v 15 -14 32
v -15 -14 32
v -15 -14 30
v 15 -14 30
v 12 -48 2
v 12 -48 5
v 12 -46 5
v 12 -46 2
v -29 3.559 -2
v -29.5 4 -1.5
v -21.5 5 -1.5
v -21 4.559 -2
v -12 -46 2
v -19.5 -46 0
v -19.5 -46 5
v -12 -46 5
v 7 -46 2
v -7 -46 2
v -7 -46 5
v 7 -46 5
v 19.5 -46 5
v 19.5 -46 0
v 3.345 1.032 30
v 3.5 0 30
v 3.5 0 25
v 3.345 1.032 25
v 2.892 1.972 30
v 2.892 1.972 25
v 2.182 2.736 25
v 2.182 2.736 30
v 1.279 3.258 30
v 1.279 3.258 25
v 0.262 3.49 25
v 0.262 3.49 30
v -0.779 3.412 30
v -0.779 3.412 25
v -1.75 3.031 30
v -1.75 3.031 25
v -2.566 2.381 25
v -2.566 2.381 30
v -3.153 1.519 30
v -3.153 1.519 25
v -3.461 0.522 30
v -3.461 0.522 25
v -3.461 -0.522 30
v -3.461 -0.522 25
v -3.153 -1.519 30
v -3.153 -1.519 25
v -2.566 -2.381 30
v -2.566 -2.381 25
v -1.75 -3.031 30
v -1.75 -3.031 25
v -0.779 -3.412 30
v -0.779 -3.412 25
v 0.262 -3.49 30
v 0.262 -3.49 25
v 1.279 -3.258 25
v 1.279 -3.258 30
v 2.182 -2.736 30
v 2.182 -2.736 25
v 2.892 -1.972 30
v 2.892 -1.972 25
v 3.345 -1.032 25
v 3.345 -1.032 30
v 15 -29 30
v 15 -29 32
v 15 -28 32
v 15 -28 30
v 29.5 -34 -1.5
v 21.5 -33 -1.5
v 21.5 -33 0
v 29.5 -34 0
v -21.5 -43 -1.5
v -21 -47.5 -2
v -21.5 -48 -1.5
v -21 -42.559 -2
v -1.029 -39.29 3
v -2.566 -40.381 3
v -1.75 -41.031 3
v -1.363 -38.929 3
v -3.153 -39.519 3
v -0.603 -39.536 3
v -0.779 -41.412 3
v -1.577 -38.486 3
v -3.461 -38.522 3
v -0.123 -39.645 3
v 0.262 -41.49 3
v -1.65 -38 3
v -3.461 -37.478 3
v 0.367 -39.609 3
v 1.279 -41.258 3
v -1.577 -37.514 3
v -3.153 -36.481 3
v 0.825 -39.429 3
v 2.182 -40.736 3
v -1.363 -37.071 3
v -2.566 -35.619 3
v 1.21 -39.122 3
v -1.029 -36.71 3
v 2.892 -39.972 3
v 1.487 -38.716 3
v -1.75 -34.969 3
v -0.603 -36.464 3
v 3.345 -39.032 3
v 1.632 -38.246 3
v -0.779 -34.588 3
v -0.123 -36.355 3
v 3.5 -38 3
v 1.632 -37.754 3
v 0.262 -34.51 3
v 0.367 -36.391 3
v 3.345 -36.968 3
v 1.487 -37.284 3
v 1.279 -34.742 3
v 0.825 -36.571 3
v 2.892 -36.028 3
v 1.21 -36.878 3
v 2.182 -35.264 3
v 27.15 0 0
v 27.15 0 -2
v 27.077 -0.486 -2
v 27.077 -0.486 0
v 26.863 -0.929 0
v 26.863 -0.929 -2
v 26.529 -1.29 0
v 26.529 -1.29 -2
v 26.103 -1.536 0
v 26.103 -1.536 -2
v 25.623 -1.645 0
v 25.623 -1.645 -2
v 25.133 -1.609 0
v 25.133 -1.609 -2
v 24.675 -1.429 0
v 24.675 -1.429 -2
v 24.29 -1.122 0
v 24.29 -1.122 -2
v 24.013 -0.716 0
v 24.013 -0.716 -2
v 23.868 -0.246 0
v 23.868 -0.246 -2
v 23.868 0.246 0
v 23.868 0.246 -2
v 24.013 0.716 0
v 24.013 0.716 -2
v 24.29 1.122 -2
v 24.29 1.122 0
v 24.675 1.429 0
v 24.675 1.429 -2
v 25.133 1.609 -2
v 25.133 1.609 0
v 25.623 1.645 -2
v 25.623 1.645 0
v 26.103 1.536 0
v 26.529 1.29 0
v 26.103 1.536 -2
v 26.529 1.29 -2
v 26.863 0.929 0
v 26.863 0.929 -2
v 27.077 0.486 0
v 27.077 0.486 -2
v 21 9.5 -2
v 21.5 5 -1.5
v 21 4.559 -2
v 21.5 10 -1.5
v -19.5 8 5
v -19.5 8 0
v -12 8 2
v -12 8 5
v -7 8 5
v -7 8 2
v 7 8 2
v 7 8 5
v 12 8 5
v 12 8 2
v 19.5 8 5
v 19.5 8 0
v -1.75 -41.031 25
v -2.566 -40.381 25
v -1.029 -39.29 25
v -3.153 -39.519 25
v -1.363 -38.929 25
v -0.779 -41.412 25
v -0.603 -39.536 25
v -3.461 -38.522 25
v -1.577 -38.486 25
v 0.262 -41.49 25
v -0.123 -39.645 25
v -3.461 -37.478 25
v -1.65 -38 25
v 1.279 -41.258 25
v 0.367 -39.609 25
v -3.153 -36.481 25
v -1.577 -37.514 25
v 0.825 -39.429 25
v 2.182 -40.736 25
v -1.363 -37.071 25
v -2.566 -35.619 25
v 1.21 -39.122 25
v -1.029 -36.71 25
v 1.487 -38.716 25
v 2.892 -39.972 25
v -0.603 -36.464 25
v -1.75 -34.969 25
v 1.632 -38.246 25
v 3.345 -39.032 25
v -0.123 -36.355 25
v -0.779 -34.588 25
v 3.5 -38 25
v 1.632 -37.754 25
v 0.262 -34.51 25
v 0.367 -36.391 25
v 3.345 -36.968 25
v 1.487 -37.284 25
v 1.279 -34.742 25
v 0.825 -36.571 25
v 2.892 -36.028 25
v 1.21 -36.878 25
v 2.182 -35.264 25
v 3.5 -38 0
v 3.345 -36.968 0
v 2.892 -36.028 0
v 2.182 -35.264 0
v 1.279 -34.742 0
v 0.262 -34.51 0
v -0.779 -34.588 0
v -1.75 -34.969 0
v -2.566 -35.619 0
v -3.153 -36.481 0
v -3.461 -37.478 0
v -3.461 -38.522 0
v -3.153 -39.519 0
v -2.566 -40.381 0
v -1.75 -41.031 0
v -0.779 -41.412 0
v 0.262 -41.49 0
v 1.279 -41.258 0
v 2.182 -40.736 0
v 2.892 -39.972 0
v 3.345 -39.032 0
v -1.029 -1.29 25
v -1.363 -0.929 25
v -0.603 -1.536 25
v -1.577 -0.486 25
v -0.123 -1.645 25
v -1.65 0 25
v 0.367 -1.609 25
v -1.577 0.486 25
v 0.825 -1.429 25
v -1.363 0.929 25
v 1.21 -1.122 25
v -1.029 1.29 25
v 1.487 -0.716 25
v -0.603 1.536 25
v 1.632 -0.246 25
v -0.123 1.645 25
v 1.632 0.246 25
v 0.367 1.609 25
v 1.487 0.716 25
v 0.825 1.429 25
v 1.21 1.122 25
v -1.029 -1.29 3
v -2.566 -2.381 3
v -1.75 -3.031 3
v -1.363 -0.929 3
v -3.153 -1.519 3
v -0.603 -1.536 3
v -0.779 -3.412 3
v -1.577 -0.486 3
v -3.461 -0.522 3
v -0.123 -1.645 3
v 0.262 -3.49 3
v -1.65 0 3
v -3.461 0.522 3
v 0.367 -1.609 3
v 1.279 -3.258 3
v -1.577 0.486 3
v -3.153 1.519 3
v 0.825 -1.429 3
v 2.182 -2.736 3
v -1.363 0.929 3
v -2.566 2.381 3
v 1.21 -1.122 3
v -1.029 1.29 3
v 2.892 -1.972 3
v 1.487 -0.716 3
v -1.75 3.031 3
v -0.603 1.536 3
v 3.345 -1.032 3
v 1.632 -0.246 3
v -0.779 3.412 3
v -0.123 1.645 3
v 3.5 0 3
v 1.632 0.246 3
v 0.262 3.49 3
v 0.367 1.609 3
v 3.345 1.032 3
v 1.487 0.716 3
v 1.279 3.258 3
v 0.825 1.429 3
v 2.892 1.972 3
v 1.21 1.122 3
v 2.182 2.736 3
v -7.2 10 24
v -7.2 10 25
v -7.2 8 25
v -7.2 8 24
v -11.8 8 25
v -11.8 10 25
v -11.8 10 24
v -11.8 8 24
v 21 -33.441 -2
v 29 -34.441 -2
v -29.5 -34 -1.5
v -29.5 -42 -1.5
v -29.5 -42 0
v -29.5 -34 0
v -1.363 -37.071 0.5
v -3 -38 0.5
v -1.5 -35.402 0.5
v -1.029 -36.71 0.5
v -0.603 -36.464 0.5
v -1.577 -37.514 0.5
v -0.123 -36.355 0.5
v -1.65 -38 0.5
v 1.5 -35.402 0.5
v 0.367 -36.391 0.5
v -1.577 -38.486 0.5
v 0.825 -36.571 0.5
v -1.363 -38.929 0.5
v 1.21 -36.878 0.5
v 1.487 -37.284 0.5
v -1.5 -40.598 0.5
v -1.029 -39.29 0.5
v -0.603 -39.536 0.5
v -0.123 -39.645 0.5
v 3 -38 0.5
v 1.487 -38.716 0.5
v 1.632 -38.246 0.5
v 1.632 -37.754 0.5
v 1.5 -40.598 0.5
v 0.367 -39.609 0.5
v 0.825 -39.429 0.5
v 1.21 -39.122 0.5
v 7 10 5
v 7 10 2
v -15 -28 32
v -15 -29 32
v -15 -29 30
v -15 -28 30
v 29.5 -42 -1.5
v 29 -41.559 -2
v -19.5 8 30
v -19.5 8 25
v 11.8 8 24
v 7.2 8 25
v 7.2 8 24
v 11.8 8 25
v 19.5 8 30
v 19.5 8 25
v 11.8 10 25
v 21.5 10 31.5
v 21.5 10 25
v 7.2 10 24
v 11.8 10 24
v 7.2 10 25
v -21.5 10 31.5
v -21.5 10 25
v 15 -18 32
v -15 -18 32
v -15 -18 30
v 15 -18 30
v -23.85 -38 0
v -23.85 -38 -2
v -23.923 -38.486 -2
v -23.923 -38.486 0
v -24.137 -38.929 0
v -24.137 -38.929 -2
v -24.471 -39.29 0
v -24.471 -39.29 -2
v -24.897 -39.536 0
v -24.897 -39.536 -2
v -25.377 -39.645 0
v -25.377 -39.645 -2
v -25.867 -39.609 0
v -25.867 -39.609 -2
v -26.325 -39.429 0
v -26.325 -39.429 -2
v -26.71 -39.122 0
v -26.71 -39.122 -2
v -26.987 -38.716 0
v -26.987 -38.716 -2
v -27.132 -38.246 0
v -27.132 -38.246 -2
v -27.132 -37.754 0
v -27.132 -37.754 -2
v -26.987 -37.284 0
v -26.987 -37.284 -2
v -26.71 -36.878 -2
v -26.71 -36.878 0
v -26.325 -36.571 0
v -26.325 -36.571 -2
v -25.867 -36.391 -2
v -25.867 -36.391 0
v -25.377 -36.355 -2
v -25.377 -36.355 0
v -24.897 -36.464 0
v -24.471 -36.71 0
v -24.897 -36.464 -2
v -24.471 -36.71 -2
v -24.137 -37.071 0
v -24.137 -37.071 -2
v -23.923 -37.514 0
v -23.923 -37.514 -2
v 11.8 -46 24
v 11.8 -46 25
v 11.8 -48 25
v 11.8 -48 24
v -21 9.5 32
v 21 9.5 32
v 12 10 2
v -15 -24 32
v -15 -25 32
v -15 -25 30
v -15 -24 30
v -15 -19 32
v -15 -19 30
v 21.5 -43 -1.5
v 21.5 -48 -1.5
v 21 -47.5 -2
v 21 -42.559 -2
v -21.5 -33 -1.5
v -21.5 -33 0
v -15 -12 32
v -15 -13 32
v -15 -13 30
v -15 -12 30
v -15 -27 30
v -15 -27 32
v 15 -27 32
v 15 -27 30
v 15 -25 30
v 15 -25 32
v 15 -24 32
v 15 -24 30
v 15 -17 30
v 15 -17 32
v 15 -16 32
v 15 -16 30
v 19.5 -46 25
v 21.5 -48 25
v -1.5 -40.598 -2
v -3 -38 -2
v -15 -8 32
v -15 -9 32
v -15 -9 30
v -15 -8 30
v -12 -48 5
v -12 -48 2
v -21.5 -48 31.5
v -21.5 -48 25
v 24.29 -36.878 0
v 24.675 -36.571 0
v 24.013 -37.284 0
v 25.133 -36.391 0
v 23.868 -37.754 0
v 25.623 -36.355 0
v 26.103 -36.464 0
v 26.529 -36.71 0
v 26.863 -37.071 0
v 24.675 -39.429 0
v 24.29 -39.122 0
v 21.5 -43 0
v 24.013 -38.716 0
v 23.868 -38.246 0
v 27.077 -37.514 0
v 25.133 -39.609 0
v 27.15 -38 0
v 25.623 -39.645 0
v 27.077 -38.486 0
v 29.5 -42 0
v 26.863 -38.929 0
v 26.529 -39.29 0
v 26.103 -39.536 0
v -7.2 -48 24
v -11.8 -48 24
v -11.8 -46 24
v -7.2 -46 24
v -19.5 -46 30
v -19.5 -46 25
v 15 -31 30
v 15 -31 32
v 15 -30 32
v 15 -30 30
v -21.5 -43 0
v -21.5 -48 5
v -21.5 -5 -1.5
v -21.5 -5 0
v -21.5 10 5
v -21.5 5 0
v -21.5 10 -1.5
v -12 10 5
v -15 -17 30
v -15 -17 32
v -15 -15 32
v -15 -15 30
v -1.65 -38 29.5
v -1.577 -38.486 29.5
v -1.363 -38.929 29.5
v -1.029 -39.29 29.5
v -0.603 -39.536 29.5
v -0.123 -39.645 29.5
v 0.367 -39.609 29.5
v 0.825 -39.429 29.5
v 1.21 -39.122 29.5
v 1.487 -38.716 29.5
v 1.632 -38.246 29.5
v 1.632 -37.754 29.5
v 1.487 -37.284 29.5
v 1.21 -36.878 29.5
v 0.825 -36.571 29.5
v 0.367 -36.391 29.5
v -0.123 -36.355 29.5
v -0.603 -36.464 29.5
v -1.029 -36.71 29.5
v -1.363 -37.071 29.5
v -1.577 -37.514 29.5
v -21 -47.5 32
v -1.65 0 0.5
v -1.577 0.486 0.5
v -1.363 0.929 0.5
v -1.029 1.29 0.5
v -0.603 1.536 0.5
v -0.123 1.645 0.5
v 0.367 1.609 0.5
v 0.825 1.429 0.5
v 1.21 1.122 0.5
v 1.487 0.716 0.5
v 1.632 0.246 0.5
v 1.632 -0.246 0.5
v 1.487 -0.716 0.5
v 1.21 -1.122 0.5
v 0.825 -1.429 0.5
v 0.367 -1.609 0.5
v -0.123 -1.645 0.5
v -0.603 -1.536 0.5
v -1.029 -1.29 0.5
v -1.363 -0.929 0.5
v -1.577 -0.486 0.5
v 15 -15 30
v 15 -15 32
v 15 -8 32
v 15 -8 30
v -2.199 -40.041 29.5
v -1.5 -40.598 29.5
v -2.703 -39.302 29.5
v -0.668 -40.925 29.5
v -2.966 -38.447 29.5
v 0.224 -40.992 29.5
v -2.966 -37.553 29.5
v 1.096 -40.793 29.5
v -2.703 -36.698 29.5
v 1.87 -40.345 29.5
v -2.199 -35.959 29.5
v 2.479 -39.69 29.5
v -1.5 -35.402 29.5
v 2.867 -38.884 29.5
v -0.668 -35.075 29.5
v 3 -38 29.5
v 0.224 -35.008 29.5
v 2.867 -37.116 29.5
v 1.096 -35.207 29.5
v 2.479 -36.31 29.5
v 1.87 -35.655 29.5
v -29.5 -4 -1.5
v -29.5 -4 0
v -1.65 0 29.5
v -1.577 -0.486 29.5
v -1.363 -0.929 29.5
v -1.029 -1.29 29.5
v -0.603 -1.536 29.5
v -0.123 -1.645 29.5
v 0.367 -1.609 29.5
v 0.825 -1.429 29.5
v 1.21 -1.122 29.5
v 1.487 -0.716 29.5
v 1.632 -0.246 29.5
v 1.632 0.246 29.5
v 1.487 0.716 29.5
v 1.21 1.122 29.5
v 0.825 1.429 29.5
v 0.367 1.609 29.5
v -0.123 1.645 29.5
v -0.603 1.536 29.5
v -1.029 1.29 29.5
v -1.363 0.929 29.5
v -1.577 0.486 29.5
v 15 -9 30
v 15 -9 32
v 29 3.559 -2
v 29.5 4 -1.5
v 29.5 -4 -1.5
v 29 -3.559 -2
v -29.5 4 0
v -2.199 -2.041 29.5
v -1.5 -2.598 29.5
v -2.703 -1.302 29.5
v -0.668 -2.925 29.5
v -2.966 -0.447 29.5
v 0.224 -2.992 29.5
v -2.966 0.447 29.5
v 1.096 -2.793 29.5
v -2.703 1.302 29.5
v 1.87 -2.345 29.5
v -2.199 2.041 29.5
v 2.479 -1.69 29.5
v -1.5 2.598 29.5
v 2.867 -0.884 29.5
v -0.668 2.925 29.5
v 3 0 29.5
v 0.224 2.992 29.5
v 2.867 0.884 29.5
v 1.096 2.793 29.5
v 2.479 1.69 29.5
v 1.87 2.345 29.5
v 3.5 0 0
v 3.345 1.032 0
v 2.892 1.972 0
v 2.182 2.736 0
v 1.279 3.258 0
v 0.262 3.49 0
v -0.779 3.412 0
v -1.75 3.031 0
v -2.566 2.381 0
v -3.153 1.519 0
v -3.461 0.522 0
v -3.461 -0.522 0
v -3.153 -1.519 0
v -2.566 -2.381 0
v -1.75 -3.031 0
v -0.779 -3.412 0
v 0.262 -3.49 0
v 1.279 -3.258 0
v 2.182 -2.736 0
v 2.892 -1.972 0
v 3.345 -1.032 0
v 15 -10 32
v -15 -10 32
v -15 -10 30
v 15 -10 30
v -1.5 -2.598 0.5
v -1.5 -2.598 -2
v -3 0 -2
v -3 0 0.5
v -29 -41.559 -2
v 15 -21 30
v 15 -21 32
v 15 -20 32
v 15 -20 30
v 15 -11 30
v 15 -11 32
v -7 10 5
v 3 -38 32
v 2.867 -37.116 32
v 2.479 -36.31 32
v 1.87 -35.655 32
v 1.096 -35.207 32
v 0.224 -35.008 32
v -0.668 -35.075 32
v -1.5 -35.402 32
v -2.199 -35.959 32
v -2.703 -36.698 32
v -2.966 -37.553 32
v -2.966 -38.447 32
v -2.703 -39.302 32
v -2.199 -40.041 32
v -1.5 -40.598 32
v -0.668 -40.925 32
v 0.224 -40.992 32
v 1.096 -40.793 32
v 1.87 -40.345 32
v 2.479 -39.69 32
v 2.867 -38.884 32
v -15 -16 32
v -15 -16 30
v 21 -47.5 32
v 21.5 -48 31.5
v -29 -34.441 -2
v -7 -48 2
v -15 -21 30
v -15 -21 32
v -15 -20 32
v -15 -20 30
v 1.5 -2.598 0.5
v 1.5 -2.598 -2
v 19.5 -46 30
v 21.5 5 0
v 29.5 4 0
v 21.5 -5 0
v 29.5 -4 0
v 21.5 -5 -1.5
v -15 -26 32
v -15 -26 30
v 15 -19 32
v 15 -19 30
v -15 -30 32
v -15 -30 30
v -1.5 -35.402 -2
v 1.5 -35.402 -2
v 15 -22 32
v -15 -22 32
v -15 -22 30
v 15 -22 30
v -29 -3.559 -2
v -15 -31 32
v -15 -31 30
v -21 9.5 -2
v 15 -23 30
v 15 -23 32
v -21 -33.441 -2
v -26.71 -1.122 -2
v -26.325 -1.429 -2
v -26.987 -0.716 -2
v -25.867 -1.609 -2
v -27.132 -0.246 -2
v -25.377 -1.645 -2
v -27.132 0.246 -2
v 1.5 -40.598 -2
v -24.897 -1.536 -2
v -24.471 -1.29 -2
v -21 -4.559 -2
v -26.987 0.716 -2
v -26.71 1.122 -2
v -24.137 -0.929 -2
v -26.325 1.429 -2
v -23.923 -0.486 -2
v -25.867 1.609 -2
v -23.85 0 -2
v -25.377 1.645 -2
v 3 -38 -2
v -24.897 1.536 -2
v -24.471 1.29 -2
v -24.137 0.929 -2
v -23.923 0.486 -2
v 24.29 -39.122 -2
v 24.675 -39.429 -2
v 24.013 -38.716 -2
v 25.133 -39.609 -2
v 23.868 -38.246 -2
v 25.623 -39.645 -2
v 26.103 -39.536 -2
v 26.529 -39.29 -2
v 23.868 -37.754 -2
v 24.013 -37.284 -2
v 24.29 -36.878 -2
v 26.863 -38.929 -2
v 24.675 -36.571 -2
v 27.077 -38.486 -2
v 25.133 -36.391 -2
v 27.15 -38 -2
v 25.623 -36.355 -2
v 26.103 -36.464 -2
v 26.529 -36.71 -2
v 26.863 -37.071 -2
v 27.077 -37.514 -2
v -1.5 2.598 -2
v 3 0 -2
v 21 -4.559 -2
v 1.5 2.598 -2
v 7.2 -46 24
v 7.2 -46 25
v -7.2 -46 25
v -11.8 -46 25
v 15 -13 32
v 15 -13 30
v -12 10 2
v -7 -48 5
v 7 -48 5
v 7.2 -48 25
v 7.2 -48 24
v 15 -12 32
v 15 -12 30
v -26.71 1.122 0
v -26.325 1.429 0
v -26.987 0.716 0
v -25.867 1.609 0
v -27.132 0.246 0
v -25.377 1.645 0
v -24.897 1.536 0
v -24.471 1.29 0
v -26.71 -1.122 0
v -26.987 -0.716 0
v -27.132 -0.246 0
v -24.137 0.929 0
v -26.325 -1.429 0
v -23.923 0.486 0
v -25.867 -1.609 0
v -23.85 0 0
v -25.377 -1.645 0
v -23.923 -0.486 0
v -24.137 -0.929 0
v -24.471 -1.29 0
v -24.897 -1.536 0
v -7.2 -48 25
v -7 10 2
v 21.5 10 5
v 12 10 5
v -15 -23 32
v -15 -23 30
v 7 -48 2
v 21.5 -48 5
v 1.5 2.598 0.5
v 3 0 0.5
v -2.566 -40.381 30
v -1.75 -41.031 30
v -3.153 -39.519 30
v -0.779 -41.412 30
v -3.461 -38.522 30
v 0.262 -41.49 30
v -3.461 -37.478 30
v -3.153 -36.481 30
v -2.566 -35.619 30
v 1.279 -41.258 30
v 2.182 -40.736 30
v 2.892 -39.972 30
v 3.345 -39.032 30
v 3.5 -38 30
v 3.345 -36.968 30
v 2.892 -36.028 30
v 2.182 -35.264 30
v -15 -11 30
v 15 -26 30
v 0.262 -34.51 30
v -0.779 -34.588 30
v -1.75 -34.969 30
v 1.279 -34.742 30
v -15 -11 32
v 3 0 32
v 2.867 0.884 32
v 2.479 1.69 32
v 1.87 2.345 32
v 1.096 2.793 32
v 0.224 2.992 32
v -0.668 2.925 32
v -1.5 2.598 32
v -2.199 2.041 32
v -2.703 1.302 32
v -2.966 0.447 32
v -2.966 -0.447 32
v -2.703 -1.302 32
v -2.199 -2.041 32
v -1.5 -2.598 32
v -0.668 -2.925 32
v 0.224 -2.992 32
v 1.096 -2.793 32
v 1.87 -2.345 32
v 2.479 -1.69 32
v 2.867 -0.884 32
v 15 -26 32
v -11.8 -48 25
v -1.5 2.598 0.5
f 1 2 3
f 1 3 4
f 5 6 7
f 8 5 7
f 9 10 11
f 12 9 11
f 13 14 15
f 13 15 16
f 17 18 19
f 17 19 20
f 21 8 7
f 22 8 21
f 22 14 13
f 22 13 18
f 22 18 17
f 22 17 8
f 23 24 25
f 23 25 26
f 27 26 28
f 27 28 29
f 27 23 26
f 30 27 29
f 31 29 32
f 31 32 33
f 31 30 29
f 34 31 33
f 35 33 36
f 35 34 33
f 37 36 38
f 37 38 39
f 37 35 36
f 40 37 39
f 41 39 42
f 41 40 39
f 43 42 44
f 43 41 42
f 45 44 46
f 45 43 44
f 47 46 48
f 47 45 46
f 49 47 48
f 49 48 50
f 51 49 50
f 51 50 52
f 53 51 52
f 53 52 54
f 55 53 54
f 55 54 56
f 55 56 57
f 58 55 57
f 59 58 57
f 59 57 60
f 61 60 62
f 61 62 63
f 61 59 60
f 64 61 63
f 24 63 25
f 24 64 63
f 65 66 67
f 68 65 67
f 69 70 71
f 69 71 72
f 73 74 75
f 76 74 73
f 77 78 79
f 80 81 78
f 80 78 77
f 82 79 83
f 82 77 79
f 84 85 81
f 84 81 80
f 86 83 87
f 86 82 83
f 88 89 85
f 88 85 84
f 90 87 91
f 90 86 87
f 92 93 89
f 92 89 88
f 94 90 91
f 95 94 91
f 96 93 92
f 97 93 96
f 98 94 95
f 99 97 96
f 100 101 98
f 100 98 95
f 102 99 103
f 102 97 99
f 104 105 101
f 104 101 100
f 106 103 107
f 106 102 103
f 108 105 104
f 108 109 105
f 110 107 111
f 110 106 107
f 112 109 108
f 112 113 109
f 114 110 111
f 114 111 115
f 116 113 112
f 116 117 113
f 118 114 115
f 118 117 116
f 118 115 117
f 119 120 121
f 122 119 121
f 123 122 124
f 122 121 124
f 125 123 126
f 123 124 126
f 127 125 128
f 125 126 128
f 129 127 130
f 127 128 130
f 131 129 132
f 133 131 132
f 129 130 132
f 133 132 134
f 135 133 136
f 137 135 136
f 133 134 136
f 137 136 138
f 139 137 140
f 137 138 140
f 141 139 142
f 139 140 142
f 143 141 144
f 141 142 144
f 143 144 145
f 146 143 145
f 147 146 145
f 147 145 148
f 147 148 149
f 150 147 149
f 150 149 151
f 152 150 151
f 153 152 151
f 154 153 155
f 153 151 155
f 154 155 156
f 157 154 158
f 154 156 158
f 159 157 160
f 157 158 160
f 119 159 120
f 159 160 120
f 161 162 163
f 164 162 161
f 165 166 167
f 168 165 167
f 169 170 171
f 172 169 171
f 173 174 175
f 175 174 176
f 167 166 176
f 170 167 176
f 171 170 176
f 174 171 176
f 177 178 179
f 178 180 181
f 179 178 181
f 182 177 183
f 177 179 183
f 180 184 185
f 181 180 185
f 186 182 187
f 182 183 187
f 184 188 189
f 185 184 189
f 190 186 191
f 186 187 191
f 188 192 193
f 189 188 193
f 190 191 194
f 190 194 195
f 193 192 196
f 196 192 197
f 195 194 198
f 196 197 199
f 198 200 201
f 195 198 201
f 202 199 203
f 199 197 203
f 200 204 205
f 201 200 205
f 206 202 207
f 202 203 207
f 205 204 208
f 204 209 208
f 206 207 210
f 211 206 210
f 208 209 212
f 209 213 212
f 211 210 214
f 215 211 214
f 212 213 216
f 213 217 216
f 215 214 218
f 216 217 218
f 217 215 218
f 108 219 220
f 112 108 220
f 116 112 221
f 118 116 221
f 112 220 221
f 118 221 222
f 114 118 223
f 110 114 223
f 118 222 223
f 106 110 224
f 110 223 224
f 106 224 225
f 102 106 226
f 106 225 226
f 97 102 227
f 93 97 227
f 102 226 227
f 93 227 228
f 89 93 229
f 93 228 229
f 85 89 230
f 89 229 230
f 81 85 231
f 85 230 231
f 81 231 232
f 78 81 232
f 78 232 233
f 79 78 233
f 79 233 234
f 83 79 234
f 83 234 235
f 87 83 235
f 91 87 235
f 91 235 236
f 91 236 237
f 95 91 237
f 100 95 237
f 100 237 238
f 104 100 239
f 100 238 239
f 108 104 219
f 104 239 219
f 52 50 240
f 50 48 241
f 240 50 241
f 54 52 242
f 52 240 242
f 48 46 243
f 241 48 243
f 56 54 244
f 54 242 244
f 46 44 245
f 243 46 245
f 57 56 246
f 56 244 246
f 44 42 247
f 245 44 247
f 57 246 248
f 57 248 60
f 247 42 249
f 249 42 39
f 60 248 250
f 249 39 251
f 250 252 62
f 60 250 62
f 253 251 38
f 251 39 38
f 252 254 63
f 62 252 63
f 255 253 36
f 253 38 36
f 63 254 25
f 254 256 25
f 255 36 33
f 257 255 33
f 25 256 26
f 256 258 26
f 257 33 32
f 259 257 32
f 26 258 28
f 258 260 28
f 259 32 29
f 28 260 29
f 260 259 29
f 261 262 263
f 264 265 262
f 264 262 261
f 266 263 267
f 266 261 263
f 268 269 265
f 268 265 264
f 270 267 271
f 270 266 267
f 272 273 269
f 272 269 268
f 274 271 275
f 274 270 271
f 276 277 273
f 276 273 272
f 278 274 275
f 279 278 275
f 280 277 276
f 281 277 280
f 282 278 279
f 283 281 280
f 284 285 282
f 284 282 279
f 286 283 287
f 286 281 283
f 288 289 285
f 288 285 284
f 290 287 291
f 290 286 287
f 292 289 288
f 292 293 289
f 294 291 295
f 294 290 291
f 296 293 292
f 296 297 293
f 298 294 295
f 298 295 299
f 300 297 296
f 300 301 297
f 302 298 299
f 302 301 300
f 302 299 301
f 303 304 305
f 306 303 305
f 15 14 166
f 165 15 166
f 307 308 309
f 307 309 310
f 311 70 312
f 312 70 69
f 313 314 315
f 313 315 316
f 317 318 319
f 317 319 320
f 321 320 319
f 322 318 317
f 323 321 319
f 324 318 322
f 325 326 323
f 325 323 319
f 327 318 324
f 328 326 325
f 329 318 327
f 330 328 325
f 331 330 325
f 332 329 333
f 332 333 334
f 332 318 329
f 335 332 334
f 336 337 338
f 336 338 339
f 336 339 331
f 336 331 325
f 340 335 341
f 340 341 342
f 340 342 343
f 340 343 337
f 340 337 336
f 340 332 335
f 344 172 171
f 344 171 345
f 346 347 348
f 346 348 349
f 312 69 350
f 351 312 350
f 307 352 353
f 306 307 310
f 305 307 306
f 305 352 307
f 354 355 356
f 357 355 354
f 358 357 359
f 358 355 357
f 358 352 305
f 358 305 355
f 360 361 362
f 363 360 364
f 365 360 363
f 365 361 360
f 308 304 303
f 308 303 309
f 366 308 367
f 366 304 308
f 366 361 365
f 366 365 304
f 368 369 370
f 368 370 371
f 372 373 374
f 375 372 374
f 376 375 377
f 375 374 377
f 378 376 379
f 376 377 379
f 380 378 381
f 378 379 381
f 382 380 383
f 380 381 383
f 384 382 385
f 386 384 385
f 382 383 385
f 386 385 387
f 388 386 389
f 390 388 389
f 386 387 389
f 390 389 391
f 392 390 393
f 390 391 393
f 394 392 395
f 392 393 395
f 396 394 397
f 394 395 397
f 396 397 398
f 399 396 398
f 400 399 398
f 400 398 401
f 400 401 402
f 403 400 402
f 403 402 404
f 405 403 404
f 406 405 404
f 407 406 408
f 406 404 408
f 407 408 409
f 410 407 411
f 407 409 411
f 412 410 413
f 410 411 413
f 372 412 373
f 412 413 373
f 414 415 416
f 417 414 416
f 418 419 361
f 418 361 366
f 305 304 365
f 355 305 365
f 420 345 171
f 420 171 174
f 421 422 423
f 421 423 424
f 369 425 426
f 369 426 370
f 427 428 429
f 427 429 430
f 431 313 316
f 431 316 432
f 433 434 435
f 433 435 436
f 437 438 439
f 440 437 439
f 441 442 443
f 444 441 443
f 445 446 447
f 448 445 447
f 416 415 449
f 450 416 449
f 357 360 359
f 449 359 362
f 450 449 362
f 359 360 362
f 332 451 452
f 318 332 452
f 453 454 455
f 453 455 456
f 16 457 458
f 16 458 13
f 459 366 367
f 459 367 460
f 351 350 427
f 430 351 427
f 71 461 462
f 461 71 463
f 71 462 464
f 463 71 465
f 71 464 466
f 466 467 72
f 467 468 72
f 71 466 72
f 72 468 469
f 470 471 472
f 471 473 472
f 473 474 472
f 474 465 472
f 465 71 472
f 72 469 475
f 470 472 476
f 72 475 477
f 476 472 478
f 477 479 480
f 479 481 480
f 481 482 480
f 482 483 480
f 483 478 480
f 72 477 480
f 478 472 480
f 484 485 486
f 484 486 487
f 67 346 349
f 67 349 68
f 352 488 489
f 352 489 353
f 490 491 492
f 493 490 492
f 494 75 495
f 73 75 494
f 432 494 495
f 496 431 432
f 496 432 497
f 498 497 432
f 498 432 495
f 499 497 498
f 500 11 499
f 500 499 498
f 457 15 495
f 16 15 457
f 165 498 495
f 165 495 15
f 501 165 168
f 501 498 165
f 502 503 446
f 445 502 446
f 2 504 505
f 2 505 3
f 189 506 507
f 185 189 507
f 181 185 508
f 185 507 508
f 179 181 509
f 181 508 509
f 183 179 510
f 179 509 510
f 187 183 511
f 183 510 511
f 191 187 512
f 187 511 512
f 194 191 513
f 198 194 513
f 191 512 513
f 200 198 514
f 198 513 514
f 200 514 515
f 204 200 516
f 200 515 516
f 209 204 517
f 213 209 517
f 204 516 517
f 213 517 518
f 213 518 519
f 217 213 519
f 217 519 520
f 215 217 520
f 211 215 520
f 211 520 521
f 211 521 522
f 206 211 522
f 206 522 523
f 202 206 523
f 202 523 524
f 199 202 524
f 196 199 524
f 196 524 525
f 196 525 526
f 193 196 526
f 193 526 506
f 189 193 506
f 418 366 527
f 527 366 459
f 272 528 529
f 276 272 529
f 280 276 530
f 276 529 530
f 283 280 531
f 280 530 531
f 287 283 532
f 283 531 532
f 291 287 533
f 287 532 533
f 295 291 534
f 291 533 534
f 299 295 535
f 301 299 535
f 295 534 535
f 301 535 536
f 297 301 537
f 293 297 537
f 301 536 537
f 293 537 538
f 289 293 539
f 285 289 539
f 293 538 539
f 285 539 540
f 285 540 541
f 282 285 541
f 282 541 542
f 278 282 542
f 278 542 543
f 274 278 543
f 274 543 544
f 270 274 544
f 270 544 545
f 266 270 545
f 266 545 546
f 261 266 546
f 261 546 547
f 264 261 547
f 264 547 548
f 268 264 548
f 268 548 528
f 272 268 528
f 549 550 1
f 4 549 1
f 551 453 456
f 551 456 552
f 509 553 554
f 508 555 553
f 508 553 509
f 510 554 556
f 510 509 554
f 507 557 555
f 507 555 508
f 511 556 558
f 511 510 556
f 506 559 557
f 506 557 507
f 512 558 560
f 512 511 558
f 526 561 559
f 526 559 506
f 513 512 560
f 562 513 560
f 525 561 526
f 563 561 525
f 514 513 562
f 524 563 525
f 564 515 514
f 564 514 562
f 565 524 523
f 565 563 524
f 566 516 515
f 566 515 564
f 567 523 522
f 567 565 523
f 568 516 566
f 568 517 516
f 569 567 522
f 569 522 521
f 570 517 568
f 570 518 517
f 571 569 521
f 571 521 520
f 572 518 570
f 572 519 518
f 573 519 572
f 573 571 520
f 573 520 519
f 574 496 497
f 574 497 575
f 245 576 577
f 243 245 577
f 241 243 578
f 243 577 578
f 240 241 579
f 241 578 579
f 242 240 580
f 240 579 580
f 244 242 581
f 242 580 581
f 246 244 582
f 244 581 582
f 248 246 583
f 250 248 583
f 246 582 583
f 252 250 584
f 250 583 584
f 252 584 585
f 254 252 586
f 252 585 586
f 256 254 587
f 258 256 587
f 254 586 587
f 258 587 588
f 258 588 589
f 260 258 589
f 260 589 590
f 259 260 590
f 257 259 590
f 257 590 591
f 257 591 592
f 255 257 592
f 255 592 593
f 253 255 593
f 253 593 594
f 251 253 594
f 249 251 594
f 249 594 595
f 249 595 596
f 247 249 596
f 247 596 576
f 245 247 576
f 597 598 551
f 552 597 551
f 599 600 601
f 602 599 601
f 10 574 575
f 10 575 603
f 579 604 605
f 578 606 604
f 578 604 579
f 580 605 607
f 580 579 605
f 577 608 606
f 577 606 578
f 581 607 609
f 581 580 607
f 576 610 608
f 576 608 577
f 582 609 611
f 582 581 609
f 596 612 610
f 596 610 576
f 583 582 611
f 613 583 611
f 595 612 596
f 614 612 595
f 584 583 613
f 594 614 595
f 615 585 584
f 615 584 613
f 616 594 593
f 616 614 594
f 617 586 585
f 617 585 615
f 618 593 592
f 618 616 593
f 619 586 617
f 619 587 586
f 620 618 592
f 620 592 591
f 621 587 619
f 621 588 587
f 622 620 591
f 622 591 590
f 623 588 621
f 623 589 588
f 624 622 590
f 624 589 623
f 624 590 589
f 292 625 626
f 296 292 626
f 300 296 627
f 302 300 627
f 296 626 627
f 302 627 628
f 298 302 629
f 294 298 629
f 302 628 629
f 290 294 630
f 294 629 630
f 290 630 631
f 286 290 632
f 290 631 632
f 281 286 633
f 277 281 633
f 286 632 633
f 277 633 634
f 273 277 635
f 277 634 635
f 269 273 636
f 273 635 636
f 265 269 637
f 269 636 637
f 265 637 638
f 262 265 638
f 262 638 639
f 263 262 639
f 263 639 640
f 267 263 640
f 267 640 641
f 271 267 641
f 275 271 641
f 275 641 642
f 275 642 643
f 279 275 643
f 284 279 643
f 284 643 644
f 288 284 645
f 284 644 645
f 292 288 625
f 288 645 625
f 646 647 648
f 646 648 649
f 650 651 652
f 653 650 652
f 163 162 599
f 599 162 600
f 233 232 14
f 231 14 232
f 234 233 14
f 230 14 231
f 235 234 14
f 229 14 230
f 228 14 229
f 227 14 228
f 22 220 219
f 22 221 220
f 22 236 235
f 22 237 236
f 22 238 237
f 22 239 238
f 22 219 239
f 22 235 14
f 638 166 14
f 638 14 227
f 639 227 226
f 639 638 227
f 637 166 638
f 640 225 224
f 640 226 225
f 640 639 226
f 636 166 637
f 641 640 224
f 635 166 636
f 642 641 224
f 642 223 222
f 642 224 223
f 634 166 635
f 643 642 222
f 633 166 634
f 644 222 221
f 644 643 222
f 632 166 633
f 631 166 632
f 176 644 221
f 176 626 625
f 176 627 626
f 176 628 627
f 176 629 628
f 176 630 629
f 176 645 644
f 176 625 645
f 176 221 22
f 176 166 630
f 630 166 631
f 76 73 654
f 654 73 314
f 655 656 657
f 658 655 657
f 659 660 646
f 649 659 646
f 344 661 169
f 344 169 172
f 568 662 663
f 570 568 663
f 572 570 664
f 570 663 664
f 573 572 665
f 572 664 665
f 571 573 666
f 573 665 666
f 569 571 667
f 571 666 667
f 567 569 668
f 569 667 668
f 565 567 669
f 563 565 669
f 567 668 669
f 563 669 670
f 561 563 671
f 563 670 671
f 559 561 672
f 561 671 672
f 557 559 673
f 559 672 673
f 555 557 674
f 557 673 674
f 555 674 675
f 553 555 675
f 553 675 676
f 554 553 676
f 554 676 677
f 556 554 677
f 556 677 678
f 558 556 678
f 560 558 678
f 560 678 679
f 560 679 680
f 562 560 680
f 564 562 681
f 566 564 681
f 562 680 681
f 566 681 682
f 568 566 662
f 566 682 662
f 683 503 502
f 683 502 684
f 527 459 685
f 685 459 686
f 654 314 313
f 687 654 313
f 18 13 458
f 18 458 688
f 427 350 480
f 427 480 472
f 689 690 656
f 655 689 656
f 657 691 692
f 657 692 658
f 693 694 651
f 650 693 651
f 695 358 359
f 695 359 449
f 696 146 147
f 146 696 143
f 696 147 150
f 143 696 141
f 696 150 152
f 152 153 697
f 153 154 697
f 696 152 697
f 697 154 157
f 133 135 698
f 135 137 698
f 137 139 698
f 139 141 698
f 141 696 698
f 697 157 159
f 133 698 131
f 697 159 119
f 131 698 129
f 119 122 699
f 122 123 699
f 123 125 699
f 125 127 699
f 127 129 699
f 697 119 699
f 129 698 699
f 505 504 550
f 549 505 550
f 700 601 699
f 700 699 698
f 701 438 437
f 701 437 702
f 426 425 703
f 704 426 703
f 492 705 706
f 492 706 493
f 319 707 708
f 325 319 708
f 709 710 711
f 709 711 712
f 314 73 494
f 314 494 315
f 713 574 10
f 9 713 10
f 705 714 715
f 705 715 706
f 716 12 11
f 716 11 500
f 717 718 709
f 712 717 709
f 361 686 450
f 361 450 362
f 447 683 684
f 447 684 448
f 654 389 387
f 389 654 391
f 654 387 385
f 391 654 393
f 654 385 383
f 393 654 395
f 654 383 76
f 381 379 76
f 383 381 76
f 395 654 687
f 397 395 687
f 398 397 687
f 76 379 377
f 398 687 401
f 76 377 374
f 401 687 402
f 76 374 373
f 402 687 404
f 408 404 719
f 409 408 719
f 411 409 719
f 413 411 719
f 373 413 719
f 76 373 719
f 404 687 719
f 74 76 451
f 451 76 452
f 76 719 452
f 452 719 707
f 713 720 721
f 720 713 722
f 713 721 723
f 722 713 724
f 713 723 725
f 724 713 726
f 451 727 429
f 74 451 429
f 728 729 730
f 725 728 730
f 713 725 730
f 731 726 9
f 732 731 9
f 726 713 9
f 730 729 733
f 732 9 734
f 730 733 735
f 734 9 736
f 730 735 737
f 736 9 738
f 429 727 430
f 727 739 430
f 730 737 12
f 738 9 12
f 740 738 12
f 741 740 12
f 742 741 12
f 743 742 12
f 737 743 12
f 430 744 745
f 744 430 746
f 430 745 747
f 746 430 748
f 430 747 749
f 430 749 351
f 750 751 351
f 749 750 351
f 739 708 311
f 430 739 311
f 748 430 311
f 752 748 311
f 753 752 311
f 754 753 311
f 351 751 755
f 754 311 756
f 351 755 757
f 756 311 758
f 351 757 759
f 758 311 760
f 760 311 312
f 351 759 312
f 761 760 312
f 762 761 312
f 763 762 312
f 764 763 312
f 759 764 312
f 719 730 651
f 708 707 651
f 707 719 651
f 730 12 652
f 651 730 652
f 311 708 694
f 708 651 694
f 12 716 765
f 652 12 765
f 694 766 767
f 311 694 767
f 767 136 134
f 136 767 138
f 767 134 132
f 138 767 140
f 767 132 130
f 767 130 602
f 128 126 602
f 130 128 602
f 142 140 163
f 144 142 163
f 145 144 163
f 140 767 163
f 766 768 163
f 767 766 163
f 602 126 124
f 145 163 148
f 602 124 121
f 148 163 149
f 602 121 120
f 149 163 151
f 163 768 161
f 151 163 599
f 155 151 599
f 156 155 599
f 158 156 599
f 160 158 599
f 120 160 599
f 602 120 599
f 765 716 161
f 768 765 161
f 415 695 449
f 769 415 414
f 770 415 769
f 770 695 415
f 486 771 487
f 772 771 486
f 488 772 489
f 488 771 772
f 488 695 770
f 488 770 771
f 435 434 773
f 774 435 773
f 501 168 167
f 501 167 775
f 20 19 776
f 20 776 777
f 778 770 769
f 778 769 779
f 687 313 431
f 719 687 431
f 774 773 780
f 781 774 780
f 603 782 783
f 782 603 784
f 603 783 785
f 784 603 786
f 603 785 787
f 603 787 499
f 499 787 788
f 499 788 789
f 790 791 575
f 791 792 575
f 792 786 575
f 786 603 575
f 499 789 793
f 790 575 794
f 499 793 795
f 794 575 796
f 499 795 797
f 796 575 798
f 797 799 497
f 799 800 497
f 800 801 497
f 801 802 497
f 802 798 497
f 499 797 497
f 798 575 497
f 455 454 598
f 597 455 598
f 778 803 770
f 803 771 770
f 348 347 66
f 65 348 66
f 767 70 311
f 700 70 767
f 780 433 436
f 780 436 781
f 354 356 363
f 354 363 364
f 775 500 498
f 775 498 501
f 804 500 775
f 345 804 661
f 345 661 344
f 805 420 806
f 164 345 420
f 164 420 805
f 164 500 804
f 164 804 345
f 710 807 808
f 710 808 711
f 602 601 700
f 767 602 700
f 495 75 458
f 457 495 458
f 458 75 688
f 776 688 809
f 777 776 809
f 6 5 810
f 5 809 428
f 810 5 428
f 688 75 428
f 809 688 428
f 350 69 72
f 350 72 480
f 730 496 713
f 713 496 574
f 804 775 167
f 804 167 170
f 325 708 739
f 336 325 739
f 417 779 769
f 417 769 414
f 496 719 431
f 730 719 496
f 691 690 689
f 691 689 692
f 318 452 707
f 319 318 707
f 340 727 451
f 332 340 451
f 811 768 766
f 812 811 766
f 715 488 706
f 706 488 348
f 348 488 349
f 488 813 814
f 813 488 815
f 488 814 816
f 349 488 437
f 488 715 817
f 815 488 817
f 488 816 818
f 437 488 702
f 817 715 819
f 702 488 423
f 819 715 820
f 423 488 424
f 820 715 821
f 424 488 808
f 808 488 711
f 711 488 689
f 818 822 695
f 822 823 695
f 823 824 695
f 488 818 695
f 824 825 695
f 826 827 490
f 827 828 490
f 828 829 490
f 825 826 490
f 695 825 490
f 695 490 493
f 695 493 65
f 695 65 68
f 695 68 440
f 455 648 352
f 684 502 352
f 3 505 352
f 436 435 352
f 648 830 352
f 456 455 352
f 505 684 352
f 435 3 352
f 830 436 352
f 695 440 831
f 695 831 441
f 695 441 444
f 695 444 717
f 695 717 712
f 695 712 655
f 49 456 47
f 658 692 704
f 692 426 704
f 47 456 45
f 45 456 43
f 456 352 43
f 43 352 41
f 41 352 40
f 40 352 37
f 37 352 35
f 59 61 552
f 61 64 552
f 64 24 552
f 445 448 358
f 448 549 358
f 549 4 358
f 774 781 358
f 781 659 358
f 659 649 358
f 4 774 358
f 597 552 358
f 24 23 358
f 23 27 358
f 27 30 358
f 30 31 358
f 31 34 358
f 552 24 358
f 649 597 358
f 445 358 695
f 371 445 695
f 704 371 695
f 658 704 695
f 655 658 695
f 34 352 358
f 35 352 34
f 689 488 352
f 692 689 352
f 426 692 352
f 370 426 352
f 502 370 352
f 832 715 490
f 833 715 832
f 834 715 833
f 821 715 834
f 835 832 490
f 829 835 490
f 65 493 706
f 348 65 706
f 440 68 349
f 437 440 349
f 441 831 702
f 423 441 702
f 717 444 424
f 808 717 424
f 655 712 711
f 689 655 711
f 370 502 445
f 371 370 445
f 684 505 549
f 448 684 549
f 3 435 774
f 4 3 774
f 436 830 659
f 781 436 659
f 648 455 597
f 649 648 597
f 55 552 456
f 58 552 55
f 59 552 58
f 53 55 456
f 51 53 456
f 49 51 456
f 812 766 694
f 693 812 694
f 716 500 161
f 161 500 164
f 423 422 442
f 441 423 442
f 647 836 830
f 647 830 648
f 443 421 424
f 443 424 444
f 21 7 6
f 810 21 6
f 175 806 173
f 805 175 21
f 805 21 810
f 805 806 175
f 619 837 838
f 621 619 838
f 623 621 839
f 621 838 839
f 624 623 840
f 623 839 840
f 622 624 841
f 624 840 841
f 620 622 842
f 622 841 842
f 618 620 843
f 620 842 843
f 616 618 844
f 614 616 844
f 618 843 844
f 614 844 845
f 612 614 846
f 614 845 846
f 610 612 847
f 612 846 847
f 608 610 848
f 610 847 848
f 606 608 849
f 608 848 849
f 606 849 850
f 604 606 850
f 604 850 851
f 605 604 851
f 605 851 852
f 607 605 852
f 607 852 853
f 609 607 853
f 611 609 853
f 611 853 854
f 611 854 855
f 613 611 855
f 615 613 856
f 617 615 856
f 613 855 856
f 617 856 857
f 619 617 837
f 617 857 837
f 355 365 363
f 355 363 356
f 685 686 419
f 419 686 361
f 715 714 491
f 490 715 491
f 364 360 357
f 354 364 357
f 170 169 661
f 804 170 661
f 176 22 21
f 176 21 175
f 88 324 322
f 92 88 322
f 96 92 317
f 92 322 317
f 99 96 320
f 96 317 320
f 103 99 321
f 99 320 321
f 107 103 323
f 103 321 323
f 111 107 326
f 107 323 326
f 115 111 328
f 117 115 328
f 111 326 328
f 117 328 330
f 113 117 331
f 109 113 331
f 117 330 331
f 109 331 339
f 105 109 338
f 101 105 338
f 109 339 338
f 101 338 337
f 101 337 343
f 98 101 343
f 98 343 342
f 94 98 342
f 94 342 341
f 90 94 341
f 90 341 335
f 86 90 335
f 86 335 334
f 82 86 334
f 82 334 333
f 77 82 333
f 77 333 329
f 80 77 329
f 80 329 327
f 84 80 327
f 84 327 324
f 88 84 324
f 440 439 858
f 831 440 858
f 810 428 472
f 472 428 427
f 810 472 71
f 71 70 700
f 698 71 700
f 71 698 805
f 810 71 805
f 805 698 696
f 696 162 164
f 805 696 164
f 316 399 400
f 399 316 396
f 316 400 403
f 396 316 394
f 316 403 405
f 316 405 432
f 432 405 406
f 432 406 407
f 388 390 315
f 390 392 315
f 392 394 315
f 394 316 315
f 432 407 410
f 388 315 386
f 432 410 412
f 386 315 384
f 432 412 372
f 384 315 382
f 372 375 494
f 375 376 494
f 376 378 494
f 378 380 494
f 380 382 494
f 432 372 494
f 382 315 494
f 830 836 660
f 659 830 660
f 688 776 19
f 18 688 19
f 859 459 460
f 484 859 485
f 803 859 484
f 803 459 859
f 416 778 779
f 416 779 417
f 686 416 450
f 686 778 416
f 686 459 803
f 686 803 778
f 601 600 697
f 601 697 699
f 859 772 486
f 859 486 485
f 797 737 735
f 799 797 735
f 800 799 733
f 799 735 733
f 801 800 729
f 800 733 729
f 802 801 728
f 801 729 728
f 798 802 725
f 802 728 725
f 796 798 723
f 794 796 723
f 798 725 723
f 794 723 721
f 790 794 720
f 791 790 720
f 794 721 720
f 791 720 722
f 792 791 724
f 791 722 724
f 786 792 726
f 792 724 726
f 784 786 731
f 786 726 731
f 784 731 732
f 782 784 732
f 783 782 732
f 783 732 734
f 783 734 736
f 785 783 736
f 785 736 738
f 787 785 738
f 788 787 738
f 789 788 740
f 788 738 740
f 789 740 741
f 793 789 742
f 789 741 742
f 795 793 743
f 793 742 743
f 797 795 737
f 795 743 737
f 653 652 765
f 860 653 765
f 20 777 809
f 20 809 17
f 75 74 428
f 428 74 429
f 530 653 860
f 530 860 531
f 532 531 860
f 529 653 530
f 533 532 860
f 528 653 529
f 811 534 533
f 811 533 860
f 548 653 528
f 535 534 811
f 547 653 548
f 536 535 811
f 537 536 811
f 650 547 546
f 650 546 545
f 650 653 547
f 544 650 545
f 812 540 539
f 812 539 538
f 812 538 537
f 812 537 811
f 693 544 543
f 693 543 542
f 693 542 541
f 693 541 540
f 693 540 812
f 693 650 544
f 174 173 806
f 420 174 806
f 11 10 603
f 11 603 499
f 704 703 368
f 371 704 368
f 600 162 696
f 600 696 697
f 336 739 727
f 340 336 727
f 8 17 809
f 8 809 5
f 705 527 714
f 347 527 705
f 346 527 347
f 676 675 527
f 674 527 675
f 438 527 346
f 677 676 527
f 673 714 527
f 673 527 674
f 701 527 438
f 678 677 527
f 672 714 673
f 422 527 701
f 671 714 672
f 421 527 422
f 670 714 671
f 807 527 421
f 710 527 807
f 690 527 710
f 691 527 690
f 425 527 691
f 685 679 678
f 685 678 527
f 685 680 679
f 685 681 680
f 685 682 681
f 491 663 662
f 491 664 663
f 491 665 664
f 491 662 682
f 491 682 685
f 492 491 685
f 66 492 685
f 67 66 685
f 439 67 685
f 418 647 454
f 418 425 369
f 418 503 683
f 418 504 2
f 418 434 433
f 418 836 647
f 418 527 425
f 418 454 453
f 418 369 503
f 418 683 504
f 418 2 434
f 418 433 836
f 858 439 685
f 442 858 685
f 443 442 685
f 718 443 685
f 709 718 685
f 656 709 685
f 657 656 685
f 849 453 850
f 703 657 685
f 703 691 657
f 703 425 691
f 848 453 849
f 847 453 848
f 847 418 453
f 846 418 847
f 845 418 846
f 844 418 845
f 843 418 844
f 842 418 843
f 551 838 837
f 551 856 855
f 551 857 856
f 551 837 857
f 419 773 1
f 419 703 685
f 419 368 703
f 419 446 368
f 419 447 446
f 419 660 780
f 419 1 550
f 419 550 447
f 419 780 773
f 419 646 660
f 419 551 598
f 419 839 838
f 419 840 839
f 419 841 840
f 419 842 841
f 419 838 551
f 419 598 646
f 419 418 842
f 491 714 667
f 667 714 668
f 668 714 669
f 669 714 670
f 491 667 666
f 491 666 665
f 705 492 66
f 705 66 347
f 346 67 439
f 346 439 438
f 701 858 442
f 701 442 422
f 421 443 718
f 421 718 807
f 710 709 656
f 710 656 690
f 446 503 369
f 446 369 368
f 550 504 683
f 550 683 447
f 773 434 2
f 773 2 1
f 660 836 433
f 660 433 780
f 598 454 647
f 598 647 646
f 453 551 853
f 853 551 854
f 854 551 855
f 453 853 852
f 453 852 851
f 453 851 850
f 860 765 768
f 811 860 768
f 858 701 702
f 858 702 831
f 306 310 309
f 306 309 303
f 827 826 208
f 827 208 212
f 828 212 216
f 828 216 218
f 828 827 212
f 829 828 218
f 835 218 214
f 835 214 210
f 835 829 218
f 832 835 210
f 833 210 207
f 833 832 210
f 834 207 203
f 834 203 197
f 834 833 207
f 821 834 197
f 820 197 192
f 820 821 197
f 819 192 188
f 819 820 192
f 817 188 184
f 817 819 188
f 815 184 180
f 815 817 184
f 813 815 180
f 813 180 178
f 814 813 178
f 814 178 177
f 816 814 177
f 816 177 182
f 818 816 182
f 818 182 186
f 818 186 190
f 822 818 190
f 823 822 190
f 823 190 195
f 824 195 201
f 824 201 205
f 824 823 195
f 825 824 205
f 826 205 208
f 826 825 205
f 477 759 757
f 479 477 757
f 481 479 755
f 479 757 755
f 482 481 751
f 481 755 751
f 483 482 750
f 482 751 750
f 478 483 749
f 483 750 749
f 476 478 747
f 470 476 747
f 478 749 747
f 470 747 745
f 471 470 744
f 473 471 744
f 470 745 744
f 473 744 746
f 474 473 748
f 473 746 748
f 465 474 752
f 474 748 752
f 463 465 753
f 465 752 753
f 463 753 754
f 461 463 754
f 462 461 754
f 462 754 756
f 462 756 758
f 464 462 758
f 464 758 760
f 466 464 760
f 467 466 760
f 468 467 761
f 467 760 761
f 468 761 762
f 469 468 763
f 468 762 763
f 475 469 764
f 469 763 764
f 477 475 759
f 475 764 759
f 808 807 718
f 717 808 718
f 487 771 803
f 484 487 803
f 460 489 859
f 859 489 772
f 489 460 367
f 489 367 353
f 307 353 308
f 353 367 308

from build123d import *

# Parameters (mm, degrees)
F0_W       = 43
F0_H       = 58
F0_W_2     = 39
F0_H_2     = 54
F0_W_3     = 35
F0_H_3     = 50
F0_R       = 3.5
F1_DEPTH   = 2
F2_DEPTH   = 5
F3_DEPTH   = 3
F5_D       = 3.3
F6_W       = 5
F6_H       = 2
F7_DEPTH   = 3
F9_R       = 3.5
F9_W       = 14
F9_H       = 2
F9_W_2     = 5
F10_DEPTH  = 2
F11_DEPTH  = 5
F12_W      = 4.6
F12_H      = 2
F13_DEPTH  = 1
F14_D      = 3.3
F15_R      = 3
F15_R_2    = 1.65
F16_DEPTH  = 2.5
F17_R      = 1.65
F18_DEPTH  = 2.5
F19_W      = 30
F19_H      = 1
F20_DEPTH  = 2
F21_R      = 1.65
F22_DEPTH  = 2
F23_SIZE   = 0.5
F23_2_SIZE = 0.5
F24_SIZE   = 0.5


with BuildPart() as f1:
    # F0 (on Top) → F1 (new body)
    with BuildSketch(Plane.XY):
        with Locations((0, -19)):
            Rectangle(F0_W, F0_H)
        with Locations((0, -19)):
            Rectangle(F0_W_2, F0_H_2, mode=Mode.SUBTRACT)
        with Locations((0, -19)):
            Rectangle(F0_W_2, F0_H_2)
        with Locations((0, -19)):
            Rectangle(F0_W_3, F0_H_3, mode=Mode.SUBTRACT)
        with Locations((0, -19)):
            Rectangle(F0_W_3, F0_H_3)
        with Locations((0, -38)):
            Circle(F0_R, mode=Mode.SUBTRACT)
        Circle(F0_R, mode=Mode.SUBTRACT)
        Circle(F0_R)
        with Locations((0, -38)):
            Circle(F0_R)
    extrude(amount=-F1_DEPTH)

    # F0 (on Top) → F2 (join)
    with BuildSketch(Plane.XY):
        with Locations((0, -19)):
            Rectangle(F0_W, F0_H)
        with Locations((0, -19)):
            Rectangle(F0_W_2, F0_H_2, mode=Mode.SUBTRACT)
    extrude(amount=F2_DEPTH)

    # F0 (on Top) → F3 (join)
    with BuildSketch(Plane.XY):
        Circle(F0_R)
        with Locations((0, -38)):
            Circle(F0_R)
    extrude(amount=F3_DEPTH)

    # F5 (through all)
    with Locations(Plane.XY.offset(3)):
        with Locations((0, -38), (0, 0)):
            Hole(F5_D / 2)

    # F6 (on face) → F7 (cut)
    with BuildSketch(Plane.XY.offset(5)):
        with Locations((9.5, -47)):
            Rectangle(F6_W, F6_H)
        with Locations((-9.5, -47)):
            Rectangle(F6_W, F6_H)
        with Locations((-9.5, 9)):
            Rectangle(F6_W, F6_H)
        with Locations((9.5, 9)):
            Rectangle(F6_W, F6_H)
    extrude(amount=-F7_DEPTH, mode=Mode.SUBTRACT)

    # F17 (on face) → F18 (cut)
    with BuildSketch(Plane(origin=(0, 0, -2), x_dir=(1, 0, 0), z_dir=(0, 0, -1))):
        Polygon((-1.5, 35.4019237886), (1.5, 35.4019237886), (3, 38), (1.5, 40.5980762114), (-1.5, 40.5980762114), (-3, 38), align=None)
        with Locations((0, 38)):
            Circle(F17_R, mode=Mode.SUBTRACT)
        Polygon((-1.5, -2.5980762114), (1.5, -2.5980762114), (3, 0), (1.5, 2.5980762114), (-1.5, 2.5980762114), (-3, 0), align=None)
        Circle(F17_R, mode=Mode.SUBTRACT)
    extrude(amount=-F18_DEPTH, mode=Mode.SUBTRACT)

    # F21 (on face) → F22 (join)
    with BuildSketch(Plane(origin=(0, 0, -2), x_dir=(1, 0, 0), z_dir=(0, 0, -1))):
        Polygon((-29.5, 34), (-21.5, 33), (-21.5, 43), (-29.5, 42), align=None)
        with Locations((-25.5, 38)):
            Circle(F21_R, mode=Mode.SUBTRACT)
        Polygon((-21.5, -5), (-21.5, 5), (-29.5, 4), (-29.5, -4), align=None)
        with Locations((-25.5, 0)):
            Circle(F21_R, mode=Mode.SUBTRACT)
        Polygon((29.5, 42), (21.5, 43), (21.5, 33), (29.5, 34), align=None)
        with Locations((25.5, 38)):
            Circle(F21_R, mode=Mode.SUBTRACT)
        Polygon((21.5, 5), (21.5, -5), (29.5, -4), (29.5, 4), align=None)
        with Locations((25.5, 0)):
            Circle(F21_R, mode=Mode.SUBTRACT)
    extrude(amount=-F22_DEPTH)

    # F23
    f23_edges = [f1.edges().sort_by_distance(p)[0] for p in [
        (21.5, -19, -2),
        (25.5, -33.5, -2),
        (29.5, -38, -2),
        (25.5, -42.5, -2),
        (21.5, -45.5, -2),
        (0, -48, -2),
        (-21.5, -45.5, -2),
        (-25.5, -42.5, -2),
        (-29.5, -38, -2),
        (-25.5, -33.5, -2),
        (-21.5, -19, -2),
        (-25.5, -4.5, -2),
        (-29.5, 0, -2),
        (-25.5, 4.5, -2),
        (-21.5, 7.5, -2),
        (0, 10, -2),
        (21.5, 7.5, -2),
        (25.5, 4.5, -2),
        (29.5, 0, -2),
        (25.5, -4.5, -2),
    ]]
    chamfer(f23_edges, length=F23_SIZE)


with BuildPart() as f10:
    # F9 (on offset) → F10 (new body)
    with BuildSketch(Plane.XY.offset(30)):
        Polygon((-7, 8), (-12, 8), (-19.5, 8), (-19.5, -46), (-12, -46), (-7, -46), (7, -46), (12, -46), (19.5, -46), (19.5, 8), (12, 8), (7, 8), align=None)
        with Locations((0, -38)):
            Circle(F9_R, mode=Mode.SUBTRACT)
        Circle(F9_R, mode=Mode.SUBTRACT)
        with Locations((0, -38)):
            Circle(F9_R)
        Circle(F9_R)
        with Locations((0, -47)):
            Rectangle(F9_W, F9_H)
        with Locations((-9.5, -47)):
            Rectangle(F9_W_2, F9_H)
        Polygon((-12, 10), (-21.5, 10), (-21.5, -48), (-12, -48), (-12, -46), (-19.5, -46), (-19.5, 8), (-12, 8), align=None)
        with Locations((9.5, -47)):
            Rectangle(F9_W_2, F9_H)
        Polygon((21.5, 10), (12, 10), (12, 8), (19.5, 8), (19.5, -46), (12, -46), (12, -48), (21.5, -48), align=None)
        with Locations((9.5, 9)):
            Rectangle(F9_W_2, F9_H)
        with Locations((0, 9)):
            Rectangle(F9_W, F9_H)
        with Locations((-9.5, 9)):
            Rectangle(F9_W_2, F9_H)
    extrude(amount=F10_DEPTH)

    # F9 (on offset) → F11 (join)
    with BuildSketch(Plane.XY.offset(30)):
        Polygon((21.5, 10), (12, 10), (12, 8), (19.5, 8), (19.5, -46), (12, -46), (12, -48), (21.5, -48), align=None)
        with Locations((9.5, -47)):
            Rectangle(F9_W_2, F9_H)
        with Locations((0, -47)):
            Rectangle(F9_W, F9_H)
        with Locations((-9.5, -47)):
            Rectangle(F9_W_2, F9_H)
        Polygon((-12, 10), (-21.5, 10), (-21.5, -48), (-12, -48), (-12, -46), (-19.5, -46), (-19.5, 8), (-12, 8), align=None)
        with Locations((-9.5, 9)):
            Rectangle(F9_W_2, F9_H)
        with Locations((0, 9)):
            Rectangle(F9_W, F9_H)
        with Locations((9.5, 9)):
            Rectangle(F9_W_2, F9_H)
        Circle(F9_R)
        with Locations((0, -38)):
            Circle(F9_R)
    extrude(amount=-F11_DEPTH)

    # F12 (on face) → F13 (join)
    with BuildSketch(Plane(origin=(0, 0, 25), x_dir=(1, 0, 0), z_dir=(0, 0, -1))):
        with Locations((-9.5, 47)):
            Rectangle(F12_W, F12_H)
        with Locations((9.5, 47)):
            Rectangle(F12_W, F12_H)
        with Locations((-9.5, -9)):
            Rectangle(F12_W, F12_H)
        with Locations((9.5, -9)):
            Rectangle(F12_W, F12_H)
    extrude(amount=F13_DEPTH)

    # F14 (through all)
    with Locations(Plane(origin=(0, 0, 25), x_dir=(1, 0, 0), z_dir=(0, 0, -1))):
        with Locations((0, 38), (0, 0)):
            Hole(F14_D / 2)

    # F15 (on face) → F16 (cut)
    with BuildSketch(Plane.XY.offset(32)):
        with Locations((0, -38)):
            Circle(F15_R)
        with Locations((0, -38)):
            Circle(F15_R_2, mode=Mode.SUBTRACT)
        Circle(F15_R)
        Circle(F15_R_2, mode=Mode.SUBTRACT)
    extrude(amount=-F16_DEPTH, mode=Mode.SUBTRACT)

    # F19 (on face) → F20 (cut, through all)
    with BuildSketch(Plane.XY.offset(32)):
        with Locations((0, -8.5)):
            Rectangle(F19_W, F19_H)
        with Locations((0, -10.5)):
            Rectangle(F19_W, F19_H)
        with Locations((0, -12.5)):
            Rectangle(F19_W, F19_H)
        with Locations((0, -14.5)):
            Rectangle(F19_W, F19_H)
        with Locations((0, -16.5)):
            Rectangle(F19_W, F19_H)
        with Locations((0, -18.5)):
            Rectangle(F19_W, F19_H)
        with Locations((0, -20.5)):
            Rectangle(F19_W, F19_H)
        with Locations((0, -22.5)):
            Rectangle(F19_W, F19_H)
        with Locations((0, -24.5)):
            Rectangle(F19_W, F19_H)
        with Locations((0, -26.5)):
            Rectangle(F19_W, F19_H)
        with Locations((0, -28.5)):
            Rectangle(F19_W, F19_H)
        with Locations((0, -30.5)):
            Rectangle(F19_W, F19_H)
    extrude(amount=-F20_DEPTH, mode=Mode.SUBTRACT)

    # F23#2
    f23_2_edges = [f10.edges().sort_by_distance(p)[0] for p in [
        (21.5, -19, 32),
    ]]
    chamfer(f23_2_edges, length=F23_2_SIZE)

    # F24
    f24_edges = [f10.edges().sort_by_distance(p)[0] for p in [
        (-0.25, -48, 32),
        (-21.5, -19, 32),
        (-0.25, 10, 32),
    ]]
    chamfer(f24_edges, length=F24_SIZE)


solid = Compound([f1.part, f10.part])
